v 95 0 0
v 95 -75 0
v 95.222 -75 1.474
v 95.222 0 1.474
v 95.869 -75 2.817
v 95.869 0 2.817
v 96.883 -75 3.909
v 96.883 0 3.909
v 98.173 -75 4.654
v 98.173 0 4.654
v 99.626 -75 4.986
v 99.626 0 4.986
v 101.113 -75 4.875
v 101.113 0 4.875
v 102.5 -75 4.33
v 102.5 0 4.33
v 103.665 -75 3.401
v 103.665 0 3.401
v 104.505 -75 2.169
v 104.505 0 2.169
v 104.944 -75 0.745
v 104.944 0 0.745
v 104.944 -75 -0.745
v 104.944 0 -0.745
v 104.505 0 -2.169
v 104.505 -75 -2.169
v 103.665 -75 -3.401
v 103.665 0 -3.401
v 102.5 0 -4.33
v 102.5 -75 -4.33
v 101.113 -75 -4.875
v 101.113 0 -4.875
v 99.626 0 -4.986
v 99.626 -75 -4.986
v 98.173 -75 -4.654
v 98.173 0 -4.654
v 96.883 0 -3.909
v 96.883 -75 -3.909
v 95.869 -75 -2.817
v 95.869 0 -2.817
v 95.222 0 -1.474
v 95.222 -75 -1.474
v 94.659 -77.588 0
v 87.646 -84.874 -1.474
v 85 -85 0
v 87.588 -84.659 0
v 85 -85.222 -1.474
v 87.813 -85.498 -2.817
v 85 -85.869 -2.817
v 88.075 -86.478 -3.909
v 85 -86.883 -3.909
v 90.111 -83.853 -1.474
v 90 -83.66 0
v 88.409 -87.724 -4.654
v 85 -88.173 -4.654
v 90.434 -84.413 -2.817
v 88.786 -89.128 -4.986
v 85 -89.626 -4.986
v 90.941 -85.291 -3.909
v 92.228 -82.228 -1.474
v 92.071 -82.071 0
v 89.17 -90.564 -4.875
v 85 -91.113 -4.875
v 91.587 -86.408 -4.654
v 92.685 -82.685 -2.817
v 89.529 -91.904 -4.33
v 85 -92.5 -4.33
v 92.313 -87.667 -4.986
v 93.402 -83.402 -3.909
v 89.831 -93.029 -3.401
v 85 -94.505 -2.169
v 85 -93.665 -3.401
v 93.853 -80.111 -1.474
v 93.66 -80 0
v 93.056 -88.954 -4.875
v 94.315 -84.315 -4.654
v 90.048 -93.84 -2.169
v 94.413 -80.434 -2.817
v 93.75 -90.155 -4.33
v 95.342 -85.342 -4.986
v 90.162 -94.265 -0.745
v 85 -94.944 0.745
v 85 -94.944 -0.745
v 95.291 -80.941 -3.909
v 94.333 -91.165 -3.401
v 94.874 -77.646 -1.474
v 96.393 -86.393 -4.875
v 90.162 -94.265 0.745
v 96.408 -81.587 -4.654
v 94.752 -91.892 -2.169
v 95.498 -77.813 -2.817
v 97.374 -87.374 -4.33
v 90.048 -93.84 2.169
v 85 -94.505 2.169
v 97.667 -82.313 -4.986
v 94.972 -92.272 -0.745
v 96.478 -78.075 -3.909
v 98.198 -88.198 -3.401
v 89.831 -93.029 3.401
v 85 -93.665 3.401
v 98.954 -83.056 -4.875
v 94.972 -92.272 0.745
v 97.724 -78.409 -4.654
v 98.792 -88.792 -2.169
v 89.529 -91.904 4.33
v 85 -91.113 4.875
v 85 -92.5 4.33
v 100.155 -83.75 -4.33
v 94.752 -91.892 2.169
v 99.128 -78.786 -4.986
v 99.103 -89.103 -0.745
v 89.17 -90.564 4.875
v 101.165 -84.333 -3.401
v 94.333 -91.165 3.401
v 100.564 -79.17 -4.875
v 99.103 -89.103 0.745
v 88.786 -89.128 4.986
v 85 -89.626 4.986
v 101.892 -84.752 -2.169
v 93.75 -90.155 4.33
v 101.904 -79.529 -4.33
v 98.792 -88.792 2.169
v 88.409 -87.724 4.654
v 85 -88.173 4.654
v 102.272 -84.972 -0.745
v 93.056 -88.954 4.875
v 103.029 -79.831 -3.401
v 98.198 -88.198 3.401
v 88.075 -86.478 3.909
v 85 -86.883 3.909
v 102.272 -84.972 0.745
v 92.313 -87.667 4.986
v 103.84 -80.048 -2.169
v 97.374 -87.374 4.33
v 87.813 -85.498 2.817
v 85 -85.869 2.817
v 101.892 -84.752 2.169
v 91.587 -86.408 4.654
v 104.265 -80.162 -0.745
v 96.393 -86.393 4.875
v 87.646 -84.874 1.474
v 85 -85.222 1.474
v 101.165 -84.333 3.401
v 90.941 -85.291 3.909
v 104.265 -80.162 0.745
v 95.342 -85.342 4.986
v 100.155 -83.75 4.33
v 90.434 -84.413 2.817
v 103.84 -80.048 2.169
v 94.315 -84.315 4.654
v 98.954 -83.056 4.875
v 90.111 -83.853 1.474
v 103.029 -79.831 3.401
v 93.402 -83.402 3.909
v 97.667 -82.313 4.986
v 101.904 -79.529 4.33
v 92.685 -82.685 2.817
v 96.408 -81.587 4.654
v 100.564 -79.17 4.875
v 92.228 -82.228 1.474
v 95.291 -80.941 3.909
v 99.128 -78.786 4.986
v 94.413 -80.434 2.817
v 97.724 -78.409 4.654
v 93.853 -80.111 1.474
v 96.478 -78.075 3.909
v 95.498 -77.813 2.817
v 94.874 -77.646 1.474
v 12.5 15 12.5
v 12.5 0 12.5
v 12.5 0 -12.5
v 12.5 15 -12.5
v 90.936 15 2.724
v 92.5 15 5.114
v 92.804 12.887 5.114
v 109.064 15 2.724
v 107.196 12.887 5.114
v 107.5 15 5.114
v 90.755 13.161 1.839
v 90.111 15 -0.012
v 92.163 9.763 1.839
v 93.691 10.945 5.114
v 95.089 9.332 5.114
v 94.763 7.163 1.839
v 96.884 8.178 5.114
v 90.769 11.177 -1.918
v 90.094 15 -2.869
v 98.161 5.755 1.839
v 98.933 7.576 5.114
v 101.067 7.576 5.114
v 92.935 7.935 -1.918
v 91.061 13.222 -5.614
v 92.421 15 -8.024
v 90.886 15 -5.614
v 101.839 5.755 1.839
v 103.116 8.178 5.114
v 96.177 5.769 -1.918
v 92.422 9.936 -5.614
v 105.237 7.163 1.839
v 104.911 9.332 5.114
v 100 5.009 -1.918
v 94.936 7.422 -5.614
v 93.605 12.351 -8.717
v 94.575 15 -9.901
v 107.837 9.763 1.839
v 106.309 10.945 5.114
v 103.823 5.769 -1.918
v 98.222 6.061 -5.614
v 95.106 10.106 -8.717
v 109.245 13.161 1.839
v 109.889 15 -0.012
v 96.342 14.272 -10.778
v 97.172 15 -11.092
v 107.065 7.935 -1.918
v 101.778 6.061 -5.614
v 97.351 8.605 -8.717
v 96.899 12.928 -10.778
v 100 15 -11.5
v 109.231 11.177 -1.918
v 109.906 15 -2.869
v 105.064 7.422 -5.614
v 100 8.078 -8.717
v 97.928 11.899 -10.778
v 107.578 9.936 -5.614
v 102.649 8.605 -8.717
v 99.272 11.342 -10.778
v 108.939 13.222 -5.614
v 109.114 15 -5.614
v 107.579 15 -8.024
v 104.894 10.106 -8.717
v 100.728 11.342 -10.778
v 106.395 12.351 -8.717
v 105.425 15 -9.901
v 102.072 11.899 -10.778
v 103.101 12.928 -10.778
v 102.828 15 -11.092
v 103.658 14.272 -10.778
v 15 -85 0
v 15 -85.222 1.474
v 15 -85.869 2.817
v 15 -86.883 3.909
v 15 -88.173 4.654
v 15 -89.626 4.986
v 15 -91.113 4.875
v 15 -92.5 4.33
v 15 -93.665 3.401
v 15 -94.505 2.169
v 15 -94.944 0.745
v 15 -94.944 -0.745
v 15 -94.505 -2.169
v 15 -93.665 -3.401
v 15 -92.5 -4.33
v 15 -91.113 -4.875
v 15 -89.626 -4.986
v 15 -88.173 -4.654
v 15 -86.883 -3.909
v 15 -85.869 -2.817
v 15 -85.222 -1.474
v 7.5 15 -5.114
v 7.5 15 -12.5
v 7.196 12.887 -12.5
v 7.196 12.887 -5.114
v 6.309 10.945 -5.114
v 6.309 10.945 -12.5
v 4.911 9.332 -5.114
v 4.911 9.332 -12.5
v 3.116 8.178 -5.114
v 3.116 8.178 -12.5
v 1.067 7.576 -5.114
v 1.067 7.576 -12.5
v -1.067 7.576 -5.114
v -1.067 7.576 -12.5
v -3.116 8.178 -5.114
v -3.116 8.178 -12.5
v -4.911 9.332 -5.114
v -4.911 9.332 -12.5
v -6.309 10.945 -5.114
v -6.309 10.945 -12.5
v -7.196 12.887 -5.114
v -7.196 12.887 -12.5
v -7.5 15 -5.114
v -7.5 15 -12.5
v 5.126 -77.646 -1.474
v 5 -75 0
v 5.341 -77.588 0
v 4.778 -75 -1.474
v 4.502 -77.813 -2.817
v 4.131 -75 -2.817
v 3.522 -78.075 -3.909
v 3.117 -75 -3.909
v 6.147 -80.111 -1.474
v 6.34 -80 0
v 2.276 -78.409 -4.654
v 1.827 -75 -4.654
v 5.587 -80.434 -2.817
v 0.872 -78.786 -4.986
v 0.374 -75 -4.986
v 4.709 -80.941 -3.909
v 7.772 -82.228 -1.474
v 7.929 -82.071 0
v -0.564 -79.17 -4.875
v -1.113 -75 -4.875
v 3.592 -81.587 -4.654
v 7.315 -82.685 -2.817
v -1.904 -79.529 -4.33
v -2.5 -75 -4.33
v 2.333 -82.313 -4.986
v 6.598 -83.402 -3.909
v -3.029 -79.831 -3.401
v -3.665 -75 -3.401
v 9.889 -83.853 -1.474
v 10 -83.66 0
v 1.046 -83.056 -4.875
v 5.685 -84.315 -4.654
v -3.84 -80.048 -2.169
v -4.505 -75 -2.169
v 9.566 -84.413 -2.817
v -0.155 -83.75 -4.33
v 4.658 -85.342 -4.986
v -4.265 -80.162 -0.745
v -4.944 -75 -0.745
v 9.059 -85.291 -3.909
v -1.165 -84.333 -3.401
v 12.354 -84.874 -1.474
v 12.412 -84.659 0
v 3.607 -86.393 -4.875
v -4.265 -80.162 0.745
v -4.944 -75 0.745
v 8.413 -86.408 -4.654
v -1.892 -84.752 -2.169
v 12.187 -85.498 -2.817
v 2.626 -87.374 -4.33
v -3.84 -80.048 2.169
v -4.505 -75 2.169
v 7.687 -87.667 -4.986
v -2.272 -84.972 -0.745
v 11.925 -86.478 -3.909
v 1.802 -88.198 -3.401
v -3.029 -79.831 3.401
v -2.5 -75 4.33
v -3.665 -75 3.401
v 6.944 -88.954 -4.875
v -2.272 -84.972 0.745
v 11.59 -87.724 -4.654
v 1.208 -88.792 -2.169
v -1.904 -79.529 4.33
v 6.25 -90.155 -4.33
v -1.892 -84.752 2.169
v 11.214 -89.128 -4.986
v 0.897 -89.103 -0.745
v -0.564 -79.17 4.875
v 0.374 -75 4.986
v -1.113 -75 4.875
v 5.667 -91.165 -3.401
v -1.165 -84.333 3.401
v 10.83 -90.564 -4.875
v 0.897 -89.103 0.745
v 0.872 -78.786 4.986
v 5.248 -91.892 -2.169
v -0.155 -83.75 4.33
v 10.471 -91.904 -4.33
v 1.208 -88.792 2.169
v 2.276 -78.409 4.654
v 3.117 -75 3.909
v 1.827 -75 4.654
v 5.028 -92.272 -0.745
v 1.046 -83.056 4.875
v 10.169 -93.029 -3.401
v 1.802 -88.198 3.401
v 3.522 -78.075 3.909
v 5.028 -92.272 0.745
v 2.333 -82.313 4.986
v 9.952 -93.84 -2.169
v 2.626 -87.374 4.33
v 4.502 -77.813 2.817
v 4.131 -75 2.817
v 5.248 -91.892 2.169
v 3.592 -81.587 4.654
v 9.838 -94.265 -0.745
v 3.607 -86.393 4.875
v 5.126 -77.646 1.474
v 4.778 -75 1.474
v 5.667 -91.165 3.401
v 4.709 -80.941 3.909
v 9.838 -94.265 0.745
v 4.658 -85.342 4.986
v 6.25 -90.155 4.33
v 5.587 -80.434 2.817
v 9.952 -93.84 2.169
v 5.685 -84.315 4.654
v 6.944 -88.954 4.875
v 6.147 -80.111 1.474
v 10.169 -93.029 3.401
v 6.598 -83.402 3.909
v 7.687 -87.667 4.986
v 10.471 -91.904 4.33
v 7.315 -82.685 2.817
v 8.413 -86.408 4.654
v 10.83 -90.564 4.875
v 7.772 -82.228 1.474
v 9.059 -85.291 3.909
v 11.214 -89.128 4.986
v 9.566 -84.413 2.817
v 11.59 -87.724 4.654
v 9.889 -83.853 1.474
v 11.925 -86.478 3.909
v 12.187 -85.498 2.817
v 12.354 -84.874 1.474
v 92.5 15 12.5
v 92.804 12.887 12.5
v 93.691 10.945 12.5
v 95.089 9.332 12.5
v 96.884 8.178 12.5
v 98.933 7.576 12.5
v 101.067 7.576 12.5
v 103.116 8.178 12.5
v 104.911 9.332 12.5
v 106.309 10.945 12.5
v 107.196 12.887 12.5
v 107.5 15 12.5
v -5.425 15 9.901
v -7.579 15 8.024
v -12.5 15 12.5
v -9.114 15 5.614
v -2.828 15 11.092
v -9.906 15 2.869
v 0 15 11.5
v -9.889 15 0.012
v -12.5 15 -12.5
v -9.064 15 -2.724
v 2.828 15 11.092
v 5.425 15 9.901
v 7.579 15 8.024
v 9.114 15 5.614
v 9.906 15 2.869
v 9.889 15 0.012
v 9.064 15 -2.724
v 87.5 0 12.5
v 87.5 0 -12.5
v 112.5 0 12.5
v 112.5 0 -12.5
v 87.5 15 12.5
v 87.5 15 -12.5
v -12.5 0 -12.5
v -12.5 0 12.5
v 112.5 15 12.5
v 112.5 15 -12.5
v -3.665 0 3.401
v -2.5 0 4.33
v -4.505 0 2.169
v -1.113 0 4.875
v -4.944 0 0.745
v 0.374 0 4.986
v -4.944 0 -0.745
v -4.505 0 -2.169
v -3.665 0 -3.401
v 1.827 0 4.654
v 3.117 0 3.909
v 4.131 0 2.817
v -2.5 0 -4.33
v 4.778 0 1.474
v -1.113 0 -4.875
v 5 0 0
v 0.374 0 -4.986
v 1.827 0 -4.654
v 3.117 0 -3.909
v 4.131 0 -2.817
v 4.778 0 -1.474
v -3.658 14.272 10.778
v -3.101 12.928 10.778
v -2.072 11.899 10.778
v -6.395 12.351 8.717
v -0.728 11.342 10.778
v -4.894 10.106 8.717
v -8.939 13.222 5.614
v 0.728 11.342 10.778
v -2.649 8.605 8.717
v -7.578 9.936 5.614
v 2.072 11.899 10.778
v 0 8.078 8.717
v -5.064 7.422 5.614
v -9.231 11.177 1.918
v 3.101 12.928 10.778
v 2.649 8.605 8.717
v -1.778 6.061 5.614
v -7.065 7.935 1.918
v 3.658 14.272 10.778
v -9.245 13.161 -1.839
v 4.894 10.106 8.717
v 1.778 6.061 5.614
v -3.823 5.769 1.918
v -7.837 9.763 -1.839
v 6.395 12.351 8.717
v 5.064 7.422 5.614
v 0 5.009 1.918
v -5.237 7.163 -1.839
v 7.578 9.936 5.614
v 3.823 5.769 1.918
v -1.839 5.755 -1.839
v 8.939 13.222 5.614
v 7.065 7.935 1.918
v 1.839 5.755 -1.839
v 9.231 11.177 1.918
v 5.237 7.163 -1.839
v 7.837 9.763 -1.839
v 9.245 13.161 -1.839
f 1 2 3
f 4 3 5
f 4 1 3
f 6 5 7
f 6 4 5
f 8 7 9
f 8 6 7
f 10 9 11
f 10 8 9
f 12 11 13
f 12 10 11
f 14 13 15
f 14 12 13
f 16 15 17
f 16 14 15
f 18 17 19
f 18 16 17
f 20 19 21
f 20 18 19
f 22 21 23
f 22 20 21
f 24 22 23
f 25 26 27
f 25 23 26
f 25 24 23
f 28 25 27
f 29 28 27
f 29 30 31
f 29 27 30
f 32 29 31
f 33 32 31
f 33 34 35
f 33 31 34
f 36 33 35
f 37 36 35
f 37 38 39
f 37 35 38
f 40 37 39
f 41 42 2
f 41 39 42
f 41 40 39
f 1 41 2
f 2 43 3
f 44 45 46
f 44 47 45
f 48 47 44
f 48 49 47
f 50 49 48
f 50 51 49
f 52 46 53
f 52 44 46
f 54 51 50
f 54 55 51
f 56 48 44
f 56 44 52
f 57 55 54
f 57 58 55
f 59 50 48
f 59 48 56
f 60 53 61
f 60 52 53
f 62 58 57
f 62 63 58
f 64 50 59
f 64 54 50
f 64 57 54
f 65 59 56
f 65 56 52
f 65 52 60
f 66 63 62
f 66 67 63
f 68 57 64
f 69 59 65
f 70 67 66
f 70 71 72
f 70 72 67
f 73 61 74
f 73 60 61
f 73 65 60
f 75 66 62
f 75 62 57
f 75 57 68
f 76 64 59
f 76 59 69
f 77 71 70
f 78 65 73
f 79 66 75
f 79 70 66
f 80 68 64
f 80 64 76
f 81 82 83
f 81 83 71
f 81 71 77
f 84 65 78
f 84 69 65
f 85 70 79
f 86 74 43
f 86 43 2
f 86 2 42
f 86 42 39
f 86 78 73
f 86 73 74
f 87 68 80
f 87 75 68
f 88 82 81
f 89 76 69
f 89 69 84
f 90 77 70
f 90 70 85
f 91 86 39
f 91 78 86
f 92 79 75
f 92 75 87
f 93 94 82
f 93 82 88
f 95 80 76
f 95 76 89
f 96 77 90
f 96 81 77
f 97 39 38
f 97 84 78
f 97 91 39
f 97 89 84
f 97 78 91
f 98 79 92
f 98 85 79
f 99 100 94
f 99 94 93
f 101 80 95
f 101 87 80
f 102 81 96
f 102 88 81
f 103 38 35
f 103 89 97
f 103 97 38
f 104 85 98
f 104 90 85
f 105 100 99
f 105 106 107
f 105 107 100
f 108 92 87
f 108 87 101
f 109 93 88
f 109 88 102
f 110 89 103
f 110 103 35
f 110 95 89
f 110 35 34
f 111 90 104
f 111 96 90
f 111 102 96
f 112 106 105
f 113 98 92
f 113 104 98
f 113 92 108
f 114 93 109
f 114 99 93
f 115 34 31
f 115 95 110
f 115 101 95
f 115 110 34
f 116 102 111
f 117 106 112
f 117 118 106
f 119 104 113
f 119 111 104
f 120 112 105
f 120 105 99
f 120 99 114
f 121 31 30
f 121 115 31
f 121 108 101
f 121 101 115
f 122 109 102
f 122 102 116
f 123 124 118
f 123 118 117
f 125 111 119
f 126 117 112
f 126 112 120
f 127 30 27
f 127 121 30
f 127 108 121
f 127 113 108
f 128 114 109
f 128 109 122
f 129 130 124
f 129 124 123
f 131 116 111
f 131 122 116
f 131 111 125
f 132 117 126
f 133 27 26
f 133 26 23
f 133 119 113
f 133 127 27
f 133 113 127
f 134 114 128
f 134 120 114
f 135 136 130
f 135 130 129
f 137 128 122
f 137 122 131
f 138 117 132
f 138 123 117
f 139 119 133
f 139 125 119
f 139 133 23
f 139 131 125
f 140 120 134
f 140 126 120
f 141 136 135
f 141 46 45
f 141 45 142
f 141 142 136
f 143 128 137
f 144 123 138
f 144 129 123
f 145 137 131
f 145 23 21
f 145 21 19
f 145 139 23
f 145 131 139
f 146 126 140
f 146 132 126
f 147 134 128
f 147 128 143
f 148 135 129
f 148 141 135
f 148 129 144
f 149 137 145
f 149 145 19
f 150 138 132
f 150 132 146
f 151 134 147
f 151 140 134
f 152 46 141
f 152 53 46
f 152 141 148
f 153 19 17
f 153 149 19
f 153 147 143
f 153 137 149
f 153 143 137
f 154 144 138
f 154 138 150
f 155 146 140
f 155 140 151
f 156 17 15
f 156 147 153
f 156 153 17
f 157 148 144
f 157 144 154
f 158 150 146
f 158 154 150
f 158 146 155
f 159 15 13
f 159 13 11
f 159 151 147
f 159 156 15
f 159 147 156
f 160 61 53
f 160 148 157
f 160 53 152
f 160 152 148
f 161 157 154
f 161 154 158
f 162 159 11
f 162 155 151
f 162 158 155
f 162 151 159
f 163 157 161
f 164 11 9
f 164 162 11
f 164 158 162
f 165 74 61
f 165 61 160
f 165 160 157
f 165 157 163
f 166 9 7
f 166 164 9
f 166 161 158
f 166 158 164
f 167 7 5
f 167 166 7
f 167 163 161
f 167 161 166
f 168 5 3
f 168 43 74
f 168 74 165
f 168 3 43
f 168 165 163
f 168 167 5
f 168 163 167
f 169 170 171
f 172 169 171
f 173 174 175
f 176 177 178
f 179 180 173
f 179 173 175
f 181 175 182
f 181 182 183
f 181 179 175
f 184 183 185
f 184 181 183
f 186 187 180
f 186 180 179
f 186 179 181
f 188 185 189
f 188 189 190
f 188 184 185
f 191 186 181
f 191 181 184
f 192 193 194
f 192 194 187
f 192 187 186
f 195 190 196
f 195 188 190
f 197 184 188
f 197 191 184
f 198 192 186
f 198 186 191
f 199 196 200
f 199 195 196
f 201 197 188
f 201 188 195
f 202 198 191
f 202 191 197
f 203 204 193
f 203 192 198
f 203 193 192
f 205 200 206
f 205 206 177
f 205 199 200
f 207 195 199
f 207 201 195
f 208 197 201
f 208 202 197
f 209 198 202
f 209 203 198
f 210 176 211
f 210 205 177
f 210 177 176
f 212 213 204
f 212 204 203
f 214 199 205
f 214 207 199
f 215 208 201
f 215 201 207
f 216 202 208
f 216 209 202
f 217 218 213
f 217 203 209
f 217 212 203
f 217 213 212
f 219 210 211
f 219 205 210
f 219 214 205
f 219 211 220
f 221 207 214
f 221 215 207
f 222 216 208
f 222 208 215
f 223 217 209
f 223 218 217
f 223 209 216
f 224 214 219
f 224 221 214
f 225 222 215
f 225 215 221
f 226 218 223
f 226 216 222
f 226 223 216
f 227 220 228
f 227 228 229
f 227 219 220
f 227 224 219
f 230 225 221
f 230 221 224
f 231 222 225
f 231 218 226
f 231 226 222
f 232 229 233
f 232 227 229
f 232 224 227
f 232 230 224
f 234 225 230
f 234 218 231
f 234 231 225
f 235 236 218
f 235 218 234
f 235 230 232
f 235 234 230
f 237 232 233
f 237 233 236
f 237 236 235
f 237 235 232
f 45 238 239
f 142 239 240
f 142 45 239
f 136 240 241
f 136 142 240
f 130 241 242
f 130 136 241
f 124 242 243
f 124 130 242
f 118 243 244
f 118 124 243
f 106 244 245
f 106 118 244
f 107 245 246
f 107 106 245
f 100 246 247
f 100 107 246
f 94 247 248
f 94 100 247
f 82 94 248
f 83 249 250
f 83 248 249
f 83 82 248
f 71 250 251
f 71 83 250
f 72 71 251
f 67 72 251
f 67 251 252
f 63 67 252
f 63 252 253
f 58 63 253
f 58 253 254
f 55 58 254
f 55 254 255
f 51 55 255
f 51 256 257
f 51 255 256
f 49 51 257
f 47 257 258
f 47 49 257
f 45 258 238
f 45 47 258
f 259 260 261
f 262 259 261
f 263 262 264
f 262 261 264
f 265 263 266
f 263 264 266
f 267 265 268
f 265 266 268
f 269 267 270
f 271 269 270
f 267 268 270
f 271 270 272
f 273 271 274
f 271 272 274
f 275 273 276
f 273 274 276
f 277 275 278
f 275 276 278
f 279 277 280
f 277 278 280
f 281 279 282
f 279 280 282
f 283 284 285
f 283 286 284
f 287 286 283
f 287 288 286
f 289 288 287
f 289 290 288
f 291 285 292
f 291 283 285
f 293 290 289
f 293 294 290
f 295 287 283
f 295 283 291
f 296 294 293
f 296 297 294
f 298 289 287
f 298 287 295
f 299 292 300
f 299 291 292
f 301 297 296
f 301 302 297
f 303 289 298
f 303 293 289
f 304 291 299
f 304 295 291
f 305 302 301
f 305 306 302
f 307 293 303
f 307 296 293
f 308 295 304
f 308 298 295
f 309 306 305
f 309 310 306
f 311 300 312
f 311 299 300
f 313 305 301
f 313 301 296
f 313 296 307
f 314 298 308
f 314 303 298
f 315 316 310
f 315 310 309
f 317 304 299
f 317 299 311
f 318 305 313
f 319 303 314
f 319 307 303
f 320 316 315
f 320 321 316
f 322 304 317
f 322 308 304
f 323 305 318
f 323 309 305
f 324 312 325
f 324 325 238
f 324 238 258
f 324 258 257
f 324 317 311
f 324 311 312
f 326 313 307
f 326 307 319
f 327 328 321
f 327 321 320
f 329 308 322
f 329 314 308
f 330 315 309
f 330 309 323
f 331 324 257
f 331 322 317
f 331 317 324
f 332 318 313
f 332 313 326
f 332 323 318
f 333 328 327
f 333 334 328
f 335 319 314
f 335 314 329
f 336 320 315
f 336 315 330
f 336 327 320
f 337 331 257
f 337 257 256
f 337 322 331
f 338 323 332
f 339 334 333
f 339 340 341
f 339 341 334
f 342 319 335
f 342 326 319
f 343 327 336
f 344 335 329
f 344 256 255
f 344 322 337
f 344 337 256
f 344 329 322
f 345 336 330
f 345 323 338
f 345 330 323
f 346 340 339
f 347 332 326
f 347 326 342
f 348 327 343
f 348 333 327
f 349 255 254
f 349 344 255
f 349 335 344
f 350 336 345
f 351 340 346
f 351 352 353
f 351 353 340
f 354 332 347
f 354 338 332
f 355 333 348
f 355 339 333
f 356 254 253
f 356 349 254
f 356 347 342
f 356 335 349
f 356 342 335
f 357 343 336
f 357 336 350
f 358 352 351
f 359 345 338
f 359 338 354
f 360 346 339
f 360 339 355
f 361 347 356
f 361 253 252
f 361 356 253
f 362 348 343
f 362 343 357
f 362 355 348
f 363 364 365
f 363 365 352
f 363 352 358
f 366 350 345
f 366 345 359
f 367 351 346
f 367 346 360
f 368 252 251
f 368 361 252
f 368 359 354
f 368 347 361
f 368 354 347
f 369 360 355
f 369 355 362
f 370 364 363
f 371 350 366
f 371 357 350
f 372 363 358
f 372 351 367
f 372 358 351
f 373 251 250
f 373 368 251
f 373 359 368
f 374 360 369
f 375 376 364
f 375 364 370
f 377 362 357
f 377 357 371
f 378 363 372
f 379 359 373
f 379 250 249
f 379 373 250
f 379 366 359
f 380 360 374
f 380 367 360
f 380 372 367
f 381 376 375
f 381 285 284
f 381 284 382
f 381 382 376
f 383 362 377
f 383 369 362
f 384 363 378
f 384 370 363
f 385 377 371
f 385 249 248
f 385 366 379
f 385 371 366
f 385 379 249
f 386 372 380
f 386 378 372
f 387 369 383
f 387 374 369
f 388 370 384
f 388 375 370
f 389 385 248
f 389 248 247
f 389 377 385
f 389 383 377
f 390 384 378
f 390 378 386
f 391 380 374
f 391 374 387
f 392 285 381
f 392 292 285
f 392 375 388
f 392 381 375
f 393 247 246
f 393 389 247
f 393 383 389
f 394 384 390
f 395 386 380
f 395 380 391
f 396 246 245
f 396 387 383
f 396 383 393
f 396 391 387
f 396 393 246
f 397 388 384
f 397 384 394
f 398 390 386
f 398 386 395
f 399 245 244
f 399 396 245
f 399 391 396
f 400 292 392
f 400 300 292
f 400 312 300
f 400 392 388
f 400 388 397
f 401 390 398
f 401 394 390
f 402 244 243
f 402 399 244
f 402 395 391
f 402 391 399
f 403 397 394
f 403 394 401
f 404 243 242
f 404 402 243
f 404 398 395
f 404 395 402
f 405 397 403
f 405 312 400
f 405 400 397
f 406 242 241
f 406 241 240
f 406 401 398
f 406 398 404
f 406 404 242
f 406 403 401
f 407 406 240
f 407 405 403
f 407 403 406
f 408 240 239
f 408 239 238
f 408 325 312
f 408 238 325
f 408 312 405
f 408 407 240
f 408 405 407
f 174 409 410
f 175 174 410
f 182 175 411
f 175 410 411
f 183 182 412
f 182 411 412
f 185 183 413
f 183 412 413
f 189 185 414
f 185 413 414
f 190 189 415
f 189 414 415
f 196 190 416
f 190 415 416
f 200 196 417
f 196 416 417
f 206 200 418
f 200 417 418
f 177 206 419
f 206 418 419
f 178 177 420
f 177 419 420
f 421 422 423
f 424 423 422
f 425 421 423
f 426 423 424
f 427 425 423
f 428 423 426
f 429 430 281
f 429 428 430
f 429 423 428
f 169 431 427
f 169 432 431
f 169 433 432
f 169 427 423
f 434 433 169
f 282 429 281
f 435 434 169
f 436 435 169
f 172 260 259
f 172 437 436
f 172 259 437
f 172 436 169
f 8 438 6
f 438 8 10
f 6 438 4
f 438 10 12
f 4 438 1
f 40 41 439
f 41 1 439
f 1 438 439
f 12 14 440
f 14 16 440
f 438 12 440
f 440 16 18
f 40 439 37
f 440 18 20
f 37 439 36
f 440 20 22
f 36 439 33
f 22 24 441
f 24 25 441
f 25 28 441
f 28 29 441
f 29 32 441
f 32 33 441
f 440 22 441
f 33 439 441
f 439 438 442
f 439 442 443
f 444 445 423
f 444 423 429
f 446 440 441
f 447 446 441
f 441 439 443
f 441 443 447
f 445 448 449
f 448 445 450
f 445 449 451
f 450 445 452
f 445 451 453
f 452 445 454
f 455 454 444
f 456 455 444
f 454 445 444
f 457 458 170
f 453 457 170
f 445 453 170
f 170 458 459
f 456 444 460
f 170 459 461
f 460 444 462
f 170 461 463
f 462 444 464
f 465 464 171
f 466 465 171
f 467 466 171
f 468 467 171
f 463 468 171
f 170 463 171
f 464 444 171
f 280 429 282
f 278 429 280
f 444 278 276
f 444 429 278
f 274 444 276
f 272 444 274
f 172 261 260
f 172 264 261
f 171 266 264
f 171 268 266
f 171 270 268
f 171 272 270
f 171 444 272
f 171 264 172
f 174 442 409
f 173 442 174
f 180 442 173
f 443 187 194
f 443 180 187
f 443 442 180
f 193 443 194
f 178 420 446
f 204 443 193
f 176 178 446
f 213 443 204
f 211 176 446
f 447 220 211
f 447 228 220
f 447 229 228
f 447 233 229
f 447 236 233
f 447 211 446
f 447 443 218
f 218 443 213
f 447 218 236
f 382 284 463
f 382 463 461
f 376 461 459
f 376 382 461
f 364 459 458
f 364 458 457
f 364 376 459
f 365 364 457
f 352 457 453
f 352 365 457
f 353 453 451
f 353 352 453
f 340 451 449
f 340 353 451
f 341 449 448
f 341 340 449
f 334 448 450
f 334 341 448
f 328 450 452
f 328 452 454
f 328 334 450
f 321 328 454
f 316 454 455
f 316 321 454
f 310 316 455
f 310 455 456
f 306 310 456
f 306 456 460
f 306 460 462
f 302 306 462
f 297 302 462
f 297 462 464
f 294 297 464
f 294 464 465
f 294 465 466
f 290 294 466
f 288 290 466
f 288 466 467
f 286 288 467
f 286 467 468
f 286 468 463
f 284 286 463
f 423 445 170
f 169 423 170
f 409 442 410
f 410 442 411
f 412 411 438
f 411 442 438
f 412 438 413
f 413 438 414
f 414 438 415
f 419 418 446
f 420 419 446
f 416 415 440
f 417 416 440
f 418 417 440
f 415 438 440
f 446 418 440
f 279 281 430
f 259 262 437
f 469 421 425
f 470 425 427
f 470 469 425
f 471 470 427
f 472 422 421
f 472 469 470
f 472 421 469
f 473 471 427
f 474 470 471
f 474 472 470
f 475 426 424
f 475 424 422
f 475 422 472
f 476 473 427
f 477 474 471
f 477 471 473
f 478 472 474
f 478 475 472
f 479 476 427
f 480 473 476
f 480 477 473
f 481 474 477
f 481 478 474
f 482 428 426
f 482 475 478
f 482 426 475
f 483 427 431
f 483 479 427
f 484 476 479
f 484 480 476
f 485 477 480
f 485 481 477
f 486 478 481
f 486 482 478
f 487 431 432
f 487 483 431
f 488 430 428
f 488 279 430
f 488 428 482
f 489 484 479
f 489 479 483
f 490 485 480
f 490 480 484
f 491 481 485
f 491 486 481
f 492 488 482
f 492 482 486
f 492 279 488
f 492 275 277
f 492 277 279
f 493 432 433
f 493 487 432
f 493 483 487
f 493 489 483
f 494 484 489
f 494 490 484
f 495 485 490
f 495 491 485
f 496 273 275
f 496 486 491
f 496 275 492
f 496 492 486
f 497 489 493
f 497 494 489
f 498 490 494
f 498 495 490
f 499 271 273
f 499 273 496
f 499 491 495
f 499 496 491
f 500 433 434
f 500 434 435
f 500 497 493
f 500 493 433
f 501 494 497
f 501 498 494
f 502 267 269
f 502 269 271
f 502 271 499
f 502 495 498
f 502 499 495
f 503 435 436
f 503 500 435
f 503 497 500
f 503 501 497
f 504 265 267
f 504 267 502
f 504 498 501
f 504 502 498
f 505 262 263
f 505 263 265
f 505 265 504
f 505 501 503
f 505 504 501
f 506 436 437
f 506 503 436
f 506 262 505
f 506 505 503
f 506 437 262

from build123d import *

# Parameters (mm, degrees)
SKETCH2_R           = 5
SKETCH4_W           = 25
SKETCH4_H           = 25
BOSS_EXTRUDE1_DEPTH = 15
SKETCH7_R           = 7.5
CUT_EXTRUDE2_DEPTH  = 15
SKETCH15_W          = 25
SKETCH15_H          = 25
BOSS_EXTRUDE3_DEPTH = 15
SKETCH17_R          = 7.5
CUT_EXTRUDE3_DEPTH  = 15


with BuildPart() as part:
    # Sweep1: sweep along a path in Sketch1
    with BuildLine(Plane.XY) as sweep1_path:
        Line((0, 0), (0, -75))
        ThreePointArc((0, -75), (4.393398122, -85.60660133), (14.999999452, -89.999999452))
        Line((14.999999452, -89.999999452), (85, -89.999999452))
        ThreePointArc((85, -89.999999452), (95.606601718, -85.60660117), (100, -74.999999452))
        Line((100, -74.999999452), (100, 0))
    # Sketch2 → Sweep1 (sweep)
    with BuildSketch(Plane(origin=(0, 0, 0), x_dir=(1, 0, 0), z_dir=(0, 1, 0))):
        Circle(SKETCH2_R)
    sweep(path=sweep1_path.line)

    # Sketch4 → Boss-Extrude1 (add)
    with BuildSketch(Plane(origin=(0, 0, 0), x_dir=(1, 0, 0), z_dir=(0, 1, 0))):
        Rectangle(SKETCH4_W, SKETCH4_H)
    extrude(amount=BOSS_EXTRUDE1_DEPTH)

    # Sketch5 → Cut-Revolve1 (revolve, cut)
    with BuildSketch(Plane(origin=(0, 15, 0), x_dir=(1, 0, 0), z_dir=(0, 1, 0))):
        with BuildLine():
            Line((0, 8.5), (0, -11.5))
            ThreePointArc((0, -11.5), (10, -1.5), (0, 8.5))
        make_face()
    revolve(axis=Axis((0, 15, -8.5), (0, 0, 1)), mode=Mode.SUBTRACT)

    # Sketch7 → Cut-Extrude2 (cut)
    with BuildSketch(Plane(origin=(0, 0, -12.5), x_dir=(-1, 0, 0), z_dir=(0, 0, -1))):
        with Locations((0, 15)):
            Circle(SKETCH7_R)
    extrude(amount=-CUT_EXTRUDE2_DEPTH, mode=Mode.SUBTRACT)

    # Sketch15 → Boss-Extrude3 (add)
    with BuildSketch(Plane(origin=(0, 0, 0), x_dir=(1, 0, 0), z_dir=(0, 1, 0))):
        with Locations((100, 0)):
            Rectangle(SKETCH15_W, SKETCH15_H)
    extrude(amount=BOSS_EXTRUDE3_DEPTH)

    # Sketch16 → Cut-Revolve2 (revolve, cut)
    with BuildSketch(Plane(origin=(0, 15, 0), x_dir=(1, 0, 0), z_dir=(0, 1, 0))):
        with BuildLine():
            Line((100, 11.5), (100, -8.5))
            ThreePointArc((100, -8.5), (110, 1.5), (100, 11.5))
        make_face()
    revolve(axis=Axis((100, 15, -11.5), (0, 0, 1)), mode=Mode.SUBTRACT)

    # Sketch17 → Cut-Extrude3 (cut)
    with BuildSketch(Plane.XY.offset(12.5)):
        with Locations((100, 15)):
            Circle(SKETCH17_R)
    extrude(amount=-CUT_EXTRUDE3_DEPTH, mode=Mode.SUBTRACT)


solid = part.part
